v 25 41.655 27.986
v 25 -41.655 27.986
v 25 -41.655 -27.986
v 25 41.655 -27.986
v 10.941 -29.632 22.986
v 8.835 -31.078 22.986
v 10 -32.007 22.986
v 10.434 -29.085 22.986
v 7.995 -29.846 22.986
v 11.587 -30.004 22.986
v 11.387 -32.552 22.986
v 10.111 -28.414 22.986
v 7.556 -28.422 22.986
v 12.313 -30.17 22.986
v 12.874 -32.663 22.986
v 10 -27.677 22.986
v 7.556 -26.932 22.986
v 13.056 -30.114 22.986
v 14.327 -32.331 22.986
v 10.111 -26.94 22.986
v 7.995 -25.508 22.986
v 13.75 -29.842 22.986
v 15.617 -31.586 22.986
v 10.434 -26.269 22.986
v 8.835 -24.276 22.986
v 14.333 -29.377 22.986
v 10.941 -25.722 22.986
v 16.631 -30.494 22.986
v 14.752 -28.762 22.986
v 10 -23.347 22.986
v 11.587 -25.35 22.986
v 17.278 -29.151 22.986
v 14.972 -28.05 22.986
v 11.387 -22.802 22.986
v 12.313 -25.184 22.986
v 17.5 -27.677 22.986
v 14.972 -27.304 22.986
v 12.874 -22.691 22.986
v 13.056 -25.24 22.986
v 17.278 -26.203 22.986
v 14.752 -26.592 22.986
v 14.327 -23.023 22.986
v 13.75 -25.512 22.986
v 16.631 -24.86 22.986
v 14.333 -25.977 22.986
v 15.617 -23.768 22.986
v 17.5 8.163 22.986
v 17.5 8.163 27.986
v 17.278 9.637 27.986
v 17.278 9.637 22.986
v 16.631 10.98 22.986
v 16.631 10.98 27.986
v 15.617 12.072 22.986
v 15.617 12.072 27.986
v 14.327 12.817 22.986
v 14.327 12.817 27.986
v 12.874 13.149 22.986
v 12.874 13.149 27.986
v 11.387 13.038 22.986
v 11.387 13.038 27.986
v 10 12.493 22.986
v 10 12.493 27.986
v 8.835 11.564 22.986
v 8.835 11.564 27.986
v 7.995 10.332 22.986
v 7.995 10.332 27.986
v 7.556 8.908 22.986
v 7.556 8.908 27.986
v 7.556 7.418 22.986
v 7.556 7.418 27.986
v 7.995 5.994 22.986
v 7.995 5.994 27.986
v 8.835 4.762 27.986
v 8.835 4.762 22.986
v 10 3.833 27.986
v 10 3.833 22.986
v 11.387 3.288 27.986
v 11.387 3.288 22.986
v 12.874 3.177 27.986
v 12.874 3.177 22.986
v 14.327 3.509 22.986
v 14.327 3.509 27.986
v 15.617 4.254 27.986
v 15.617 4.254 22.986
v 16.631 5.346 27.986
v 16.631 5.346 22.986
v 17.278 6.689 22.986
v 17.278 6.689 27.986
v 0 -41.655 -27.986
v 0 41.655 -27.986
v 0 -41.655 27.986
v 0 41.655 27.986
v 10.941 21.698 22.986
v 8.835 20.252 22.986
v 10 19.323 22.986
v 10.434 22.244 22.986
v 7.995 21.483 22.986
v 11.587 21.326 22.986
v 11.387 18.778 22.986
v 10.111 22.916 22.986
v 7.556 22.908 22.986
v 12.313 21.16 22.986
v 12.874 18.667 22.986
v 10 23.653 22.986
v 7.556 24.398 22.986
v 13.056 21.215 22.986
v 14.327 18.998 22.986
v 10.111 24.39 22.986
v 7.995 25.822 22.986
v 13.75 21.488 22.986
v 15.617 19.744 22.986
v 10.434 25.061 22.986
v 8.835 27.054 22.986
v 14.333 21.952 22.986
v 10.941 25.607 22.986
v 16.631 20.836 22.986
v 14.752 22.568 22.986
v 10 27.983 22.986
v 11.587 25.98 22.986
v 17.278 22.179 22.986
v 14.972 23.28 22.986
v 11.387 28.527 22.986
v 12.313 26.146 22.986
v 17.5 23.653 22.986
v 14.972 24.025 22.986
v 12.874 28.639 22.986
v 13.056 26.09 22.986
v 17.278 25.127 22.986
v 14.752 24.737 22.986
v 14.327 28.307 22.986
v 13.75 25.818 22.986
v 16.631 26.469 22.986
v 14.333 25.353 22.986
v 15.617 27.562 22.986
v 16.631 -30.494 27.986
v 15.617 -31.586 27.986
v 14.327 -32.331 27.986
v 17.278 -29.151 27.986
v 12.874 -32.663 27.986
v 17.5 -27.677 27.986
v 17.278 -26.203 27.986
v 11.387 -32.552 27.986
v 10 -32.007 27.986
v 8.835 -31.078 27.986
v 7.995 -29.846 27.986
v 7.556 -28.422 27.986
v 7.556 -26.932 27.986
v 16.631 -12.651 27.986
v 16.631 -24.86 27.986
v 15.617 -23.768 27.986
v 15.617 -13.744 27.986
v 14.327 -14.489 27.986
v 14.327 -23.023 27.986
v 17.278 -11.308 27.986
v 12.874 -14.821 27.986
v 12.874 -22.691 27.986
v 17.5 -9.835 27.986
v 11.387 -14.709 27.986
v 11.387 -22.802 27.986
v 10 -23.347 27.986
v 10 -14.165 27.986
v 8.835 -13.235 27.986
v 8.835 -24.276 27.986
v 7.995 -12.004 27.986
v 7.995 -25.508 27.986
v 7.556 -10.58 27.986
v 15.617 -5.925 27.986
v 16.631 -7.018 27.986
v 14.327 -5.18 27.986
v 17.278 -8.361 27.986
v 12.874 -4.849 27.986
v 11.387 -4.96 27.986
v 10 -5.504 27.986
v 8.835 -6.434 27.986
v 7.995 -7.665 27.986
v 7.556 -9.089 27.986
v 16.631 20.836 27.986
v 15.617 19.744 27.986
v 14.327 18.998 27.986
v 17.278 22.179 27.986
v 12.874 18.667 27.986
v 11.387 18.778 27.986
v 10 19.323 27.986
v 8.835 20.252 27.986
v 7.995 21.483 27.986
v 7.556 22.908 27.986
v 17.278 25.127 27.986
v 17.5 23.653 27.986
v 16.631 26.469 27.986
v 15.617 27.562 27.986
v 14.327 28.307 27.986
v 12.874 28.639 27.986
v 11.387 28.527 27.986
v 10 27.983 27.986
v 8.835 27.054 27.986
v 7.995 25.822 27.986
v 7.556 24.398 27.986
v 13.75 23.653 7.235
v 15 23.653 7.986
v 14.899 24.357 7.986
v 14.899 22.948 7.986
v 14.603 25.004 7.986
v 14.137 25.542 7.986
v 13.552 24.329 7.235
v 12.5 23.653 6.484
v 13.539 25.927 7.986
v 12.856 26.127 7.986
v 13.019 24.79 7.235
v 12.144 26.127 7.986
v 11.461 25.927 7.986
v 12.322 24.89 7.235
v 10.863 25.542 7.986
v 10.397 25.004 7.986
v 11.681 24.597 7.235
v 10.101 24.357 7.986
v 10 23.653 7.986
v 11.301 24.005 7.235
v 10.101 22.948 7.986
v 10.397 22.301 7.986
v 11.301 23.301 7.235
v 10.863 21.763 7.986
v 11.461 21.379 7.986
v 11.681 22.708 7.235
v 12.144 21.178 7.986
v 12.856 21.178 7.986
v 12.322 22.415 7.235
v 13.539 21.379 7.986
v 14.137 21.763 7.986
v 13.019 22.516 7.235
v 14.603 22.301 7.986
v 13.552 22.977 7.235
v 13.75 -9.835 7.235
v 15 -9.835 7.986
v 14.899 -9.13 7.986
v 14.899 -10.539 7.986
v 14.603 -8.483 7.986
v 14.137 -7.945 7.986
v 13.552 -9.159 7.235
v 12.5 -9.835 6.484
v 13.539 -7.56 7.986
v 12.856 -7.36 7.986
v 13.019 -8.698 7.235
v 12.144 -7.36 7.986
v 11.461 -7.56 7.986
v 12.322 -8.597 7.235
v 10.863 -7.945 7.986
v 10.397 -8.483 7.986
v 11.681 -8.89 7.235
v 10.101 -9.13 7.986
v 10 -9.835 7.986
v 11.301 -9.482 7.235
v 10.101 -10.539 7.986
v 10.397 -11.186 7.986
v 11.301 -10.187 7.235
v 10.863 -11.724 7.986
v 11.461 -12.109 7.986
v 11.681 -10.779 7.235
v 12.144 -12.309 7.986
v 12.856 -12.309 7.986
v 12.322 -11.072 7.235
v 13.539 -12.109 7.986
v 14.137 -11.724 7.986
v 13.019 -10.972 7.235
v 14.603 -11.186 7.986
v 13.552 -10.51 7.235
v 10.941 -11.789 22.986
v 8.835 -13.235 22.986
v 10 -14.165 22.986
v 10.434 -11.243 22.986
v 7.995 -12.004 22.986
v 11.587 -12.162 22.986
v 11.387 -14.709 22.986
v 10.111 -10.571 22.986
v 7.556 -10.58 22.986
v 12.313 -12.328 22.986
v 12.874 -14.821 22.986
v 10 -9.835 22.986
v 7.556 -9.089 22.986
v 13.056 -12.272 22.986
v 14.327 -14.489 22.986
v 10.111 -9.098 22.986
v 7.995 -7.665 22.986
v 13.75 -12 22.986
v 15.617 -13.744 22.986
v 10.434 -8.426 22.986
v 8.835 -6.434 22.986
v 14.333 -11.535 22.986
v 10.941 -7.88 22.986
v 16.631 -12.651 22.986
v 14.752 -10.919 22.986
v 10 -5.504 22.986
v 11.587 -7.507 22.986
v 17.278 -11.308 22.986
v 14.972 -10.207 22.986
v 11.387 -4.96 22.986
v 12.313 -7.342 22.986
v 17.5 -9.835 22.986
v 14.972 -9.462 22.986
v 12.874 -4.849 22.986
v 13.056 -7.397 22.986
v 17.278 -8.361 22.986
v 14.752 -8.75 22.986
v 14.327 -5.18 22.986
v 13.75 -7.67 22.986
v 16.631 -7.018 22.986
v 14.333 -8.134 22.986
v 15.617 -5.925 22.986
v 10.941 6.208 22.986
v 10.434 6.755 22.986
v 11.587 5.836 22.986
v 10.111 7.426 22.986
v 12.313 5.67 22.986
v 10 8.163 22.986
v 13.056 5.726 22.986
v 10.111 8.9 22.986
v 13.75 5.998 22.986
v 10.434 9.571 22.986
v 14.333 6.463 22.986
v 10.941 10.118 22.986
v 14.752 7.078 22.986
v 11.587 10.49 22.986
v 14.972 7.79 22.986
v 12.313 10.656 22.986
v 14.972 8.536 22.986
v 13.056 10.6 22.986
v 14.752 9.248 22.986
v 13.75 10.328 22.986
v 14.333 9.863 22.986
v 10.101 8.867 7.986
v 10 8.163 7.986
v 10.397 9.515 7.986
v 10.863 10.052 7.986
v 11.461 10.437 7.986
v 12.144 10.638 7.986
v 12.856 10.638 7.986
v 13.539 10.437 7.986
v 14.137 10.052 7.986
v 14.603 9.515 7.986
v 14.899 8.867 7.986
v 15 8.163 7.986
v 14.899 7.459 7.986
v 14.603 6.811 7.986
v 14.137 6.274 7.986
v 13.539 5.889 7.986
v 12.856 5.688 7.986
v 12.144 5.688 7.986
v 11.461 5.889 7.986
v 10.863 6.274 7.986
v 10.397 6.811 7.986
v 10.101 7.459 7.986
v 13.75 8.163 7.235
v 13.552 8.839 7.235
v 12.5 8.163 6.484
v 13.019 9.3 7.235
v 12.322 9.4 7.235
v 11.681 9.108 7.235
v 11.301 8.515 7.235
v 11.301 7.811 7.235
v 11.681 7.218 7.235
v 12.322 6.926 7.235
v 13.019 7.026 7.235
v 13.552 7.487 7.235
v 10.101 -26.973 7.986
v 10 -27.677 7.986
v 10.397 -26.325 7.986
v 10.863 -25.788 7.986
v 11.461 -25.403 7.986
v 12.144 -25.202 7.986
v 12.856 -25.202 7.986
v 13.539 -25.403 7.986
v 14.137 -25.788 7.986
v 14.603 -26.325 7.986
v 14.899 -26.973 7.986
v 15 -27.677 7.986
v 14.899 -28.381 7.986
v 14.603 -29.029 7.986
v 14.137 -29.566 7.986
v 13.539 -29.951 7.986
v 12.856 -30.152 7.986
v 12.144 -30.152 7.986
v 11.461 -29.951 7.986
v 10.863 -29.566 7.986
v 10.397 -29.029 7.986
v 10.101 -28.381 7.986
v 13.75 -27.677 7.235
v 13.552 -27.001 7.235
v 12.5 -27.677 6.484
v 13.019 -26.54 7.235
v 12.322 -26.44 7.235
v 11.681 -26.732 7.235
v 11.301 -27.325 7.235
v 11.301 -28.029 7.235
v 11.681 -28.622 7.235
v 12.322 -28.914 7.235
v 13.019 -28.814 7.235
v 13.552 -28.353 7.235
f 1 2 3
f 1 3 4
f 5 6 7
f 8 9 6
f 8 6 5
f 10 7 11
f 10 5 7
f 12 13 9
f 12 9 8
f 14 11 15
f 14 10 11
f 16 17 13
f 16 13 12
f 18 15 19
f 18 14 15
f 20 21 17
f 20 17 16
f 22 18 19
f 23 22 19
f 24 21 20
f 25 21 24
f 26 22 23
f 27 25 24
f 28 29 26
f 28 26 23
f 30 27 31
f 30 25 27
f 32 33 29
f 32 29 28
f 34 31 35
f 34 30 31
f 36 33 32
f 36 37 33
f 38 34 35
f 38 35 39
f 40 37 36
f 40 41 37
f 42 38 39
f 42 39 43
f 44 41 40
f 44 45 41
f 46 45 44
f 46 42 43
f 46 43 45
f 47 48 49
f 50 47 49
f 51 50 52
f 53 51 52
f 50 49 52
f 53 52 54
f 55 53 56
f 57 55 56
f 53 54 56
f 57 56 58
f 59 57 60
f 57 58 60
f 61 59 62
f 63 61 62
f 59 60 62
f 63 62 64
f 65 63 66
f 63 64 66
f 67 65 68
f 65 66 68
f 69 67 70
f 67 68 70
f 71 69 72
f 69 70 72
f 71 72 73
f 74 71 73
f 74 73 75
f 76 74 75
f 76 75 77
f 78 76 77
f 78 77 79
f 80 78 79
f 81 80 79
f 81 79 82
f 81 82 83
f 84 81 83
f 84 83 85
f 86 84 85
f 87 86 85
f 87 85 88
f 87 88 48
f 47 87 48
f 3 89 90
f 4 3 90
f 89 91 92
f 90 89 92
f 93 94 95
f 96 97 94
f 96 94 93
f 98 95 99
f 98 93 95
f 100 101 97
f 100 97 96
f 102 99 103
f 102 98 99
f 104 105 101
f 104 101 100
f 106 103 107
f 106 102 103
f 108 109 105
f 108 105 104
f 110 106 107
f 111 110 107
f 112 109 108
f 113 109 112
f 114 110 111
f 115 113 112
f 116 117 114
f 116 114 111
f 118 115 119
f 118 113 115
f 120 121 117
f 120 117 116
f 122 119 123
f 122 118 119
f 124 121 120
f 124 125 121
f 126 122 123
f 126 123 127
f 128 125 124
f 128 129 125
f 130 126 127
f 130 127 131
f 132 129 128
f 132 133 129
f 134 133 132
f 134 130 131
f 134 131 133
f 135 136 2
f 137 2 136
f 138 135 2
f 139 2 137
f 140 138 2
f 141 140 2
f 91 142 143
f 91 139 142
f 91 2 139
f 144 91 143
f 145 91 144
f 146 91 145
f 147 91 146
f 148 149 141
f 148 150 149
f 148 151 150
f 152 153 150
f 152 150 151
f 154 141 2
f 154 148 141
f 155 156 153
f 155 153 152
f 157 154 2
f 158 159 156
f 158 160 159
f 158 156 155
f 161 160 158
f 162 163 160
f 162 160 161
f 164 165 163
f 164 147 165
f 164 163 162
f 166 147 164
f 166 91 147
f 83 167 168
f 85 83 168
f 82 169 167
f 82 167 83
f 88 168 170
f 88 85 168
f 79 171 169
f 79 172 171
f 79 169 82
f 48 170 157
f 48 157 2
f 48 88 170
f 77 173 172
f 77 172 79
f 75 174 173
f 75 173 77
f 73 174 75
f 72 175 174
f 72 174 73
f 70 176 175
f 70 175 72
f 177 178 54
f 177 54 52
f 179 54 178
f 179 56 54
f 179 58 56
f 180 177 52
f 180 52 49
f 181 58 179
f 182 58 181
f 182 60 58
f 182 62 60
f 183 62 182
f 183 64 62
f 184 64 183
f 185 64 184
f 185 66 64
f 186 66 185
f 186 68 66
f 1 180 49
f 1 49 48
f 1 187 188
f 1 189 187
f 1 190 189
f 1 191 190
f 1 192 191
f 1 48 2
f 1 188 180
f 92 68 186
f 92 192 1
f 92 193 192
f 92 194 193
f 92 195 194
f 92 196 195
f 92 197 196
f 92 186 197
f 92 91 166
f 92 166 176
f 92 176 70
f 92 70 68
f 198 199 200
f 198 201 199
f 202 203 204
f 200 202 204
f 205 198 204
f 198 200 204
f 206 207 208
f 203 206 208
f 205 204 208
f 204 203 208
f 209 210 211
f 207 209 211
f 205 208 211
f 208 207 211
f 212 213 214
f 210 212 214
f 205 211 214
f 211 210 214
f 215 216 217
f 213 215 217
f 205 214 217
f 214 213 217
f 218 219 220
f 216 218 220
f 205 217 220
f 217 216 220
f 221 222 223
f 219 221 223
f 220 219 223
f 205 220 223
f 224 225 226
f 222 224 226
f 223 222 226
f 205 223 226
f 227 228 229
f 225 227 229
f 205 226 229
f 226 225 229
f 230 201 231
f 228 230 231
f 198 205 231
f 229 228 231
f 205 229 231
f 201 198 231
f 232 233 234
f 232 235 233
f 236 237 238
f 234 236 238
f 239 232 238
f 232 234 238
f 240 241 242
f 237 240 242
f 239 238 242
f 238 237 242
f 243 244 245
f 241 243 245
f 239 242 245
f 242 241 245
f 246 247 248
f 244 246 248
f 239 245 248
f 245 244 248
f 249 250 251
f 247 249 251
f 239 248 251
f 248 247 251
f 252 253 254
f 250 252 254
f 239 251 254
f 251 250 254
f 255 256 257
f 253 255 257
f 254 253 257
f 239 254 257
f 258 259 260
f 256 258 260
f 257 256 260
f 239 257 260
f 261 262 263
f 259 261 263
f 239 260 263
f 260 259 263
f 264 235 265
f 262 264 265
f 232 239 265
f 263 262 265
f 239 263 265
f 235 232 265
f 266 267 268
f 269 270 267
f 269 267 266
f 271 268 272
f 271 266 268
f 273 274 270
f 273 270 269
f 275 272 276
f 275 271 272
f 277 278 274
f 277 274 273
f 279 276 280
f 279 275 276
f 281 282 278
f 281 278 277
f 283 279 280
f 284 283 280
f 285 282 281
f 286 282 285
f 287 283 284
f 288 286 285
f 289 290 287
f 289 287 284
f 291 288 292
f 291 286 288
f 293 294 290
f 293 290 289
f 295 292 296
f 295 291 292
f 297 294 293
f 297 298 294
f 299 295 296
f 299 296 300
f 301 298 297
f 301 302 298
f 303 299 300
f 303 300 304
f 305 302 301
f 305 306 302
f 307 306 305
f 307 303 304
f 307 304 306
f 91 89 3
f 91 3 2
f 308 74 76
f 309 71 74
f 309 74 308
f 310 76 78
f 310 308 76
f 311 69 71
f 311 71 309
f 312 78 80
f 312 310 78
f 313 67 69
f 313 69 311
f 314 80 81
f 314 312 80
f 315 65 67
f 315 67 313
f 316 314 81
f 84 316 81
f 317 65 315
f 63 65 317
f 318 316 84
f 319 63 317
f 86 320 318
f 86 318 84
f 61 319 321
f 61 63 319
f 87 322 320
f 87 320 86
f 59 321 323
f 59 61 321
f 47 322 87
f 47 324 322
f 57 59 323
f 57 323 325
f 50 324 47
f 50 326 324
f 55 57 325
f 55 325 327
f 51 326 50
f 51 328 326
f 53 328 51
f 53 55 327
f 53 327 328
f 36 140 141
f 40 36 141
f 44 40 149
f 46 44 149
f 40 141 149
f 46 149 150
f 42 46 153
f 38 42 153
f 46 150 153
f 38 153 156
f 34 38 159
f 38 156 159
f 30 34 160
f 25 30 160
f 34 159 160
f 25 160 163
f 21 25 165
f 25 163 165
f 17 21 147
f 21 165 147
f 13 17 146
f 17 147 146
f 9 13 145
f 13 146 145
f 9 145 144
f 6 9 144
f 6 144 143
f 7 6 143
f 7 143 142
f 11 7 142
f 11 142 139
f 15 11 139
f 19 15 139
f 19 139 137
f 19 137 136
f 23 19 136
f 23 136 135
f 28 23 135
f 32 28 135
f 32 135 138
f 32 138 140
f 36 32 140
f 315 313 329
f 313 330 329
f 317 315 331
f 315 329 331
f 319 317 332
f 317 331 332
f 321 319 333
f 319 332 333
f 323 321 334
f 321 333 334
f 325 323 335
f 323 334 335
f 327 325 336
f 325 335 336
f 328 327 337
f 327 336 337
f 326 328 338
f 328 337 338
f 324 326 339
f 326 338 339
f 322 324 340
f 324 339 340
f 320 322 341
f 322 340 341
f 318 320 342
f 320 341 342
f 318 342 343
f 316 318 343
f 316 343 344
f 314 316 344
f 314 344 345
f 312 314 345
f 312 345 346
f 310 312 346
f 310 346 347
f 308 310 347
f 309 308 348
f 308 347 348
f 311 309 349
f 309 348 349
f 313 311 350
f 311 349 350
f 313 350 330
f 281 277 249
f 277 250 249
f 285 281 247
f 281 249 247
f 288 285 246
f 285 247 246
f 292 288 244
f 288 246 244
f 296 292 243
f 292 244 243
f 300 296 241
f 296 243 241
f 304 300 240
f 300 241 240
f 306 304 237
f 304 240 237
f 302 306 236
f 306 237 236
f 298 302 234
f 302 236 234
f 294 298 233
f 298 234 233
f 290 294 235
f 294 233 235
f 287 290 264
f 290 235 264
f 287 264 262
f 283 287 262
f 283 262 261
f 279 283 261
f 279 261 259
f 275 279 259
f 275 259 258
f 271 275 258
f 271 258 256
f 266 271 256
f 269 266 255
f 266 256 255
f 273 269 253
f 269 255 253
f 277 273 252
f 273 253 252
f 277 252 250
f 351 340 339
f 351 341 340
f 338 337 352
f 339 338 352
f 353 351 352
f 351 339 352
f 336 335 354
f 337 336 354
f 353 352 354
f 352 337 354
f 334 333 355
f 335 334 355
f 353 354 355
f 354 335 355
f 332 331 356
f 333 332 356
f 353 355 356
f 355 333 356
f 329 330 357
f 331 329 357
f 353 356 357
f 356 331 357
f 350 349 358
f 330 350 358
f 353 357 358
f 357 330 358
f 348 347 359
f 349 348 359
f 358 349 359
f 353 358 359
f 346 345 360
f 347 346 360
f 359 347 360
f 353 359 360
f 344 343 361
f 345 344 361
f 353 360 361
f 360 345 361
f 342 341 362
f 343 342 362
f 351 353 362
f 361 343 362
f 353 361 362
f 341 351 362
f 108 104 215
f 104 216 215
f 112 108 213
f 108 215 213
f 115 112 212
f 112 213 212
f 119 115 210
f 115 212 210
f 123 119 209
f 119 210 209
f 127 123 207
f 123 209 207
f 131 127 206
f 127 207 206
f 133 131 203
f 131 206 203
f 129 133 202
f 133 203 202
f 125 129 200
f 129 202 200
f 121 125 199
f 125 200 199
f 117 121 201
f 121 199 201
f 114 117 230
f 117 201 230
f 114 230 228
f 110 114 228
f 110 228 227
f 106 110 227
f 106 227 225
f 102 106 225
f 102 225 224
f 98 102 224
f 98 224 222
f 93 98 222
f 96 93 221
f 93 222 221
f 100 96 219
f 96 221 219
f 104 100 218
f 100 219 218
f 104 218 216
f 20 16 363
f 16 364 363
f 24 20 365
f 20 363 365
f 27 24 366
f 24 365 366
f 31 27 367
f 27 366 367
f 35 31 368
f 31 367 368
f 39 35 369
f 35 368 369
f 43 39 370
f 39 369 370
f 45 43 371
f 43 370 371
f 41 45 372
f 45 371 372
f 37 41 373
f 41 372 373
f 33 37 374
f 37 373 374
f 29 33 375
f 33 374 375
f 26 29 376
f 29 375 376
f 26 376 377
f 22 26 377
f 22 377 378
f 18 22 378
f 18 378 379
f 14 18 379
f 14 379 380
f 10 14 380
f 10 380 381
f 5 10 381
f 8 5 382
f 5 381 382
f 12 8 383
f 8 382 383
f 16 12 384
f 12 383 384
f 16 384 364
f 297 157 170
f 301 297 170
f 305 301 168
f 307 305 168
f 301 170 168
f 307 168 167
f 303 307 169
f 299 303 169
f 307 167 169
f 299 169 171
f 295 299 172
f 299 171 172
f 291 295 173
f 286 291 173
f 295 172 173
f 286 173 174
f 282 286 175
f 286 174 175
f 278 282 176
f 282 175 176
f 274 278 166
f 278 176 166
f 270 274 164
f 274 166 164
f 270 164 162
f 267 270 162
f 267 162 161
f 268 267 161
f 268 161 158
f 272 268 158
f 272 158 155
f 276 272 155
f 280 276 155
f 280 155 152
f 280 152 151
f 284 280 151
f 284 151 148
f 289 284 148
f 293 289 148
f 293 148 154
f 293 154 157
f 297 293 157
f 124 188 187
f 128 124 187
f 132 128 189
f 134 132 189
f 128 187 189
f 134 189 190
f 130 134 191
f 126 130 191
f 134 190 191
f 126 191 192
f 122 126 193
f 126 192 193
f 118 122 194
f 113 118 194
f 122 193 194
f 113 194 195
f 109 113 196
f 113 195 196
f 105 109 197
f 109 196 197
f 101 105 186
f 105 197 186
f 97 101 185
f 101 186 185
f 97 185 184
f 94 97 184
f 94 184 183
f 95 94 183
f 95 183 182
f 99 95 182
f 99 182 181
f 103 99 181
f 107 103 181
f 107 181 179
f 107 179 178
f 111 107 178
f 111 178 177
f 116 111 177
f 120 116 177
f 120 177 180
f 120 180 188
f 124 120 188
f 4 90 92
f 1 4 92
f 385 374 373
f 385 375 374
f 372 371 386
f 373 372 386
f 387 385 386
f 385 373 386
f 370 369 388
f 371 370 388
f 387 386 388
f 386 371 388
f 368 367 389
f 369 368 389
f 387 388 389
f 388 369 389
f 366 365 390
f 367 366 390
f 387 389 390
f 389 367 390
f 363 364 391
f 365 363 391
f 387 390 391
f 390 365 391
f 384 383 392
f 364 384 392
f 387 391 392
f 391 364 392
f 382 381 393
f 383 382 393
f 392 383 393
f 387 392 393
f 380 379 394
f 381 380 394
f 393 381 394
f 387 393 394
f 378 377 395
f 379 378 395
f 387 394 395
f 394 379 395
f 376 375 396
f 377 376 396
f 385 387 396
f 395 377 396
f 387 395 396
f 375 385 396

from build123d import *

# Parameters (mm, degrees)
F0_W           = 83.3091139793
F0_H           = 55.9713058174
F1_DEPTH       = 25
F3_D           = 5
F3_DEPTH       = 20
F3_CBORE_D     = 10
F3_CBORE_DEPTH = 5
F3_TIP         = 1.5021515476


with BuildPart() as f1:
    # F0 (on Right) → F1 (new body)
    with BuildSketch(Plane.YZ):
        Rectangle(F0_W, F0_H)
    extrude(amount=F1_DEPTH)

    # F3
    with Locations(Plane.XY.offset(27.9856529087)):
        with Locations((12.5, -27.6769809425), (12.5, -9.8345736042), (12.5, 8.1630079076), (12.5, 23.6527305096)):
            CounterBoreHole(F3_D / 2, F3_CBORE_D / 2, F3_CBORE_DEPTH, depth=F3_DEPTH)
            with Locations((0, 0, -(F3_DEPTH + F3_TIP / 2))):  # 118° drill point
                Cone(0, F3_D / 2, F3_TIP, mode=Mode.SUBTRACT)


solid = f1.part
